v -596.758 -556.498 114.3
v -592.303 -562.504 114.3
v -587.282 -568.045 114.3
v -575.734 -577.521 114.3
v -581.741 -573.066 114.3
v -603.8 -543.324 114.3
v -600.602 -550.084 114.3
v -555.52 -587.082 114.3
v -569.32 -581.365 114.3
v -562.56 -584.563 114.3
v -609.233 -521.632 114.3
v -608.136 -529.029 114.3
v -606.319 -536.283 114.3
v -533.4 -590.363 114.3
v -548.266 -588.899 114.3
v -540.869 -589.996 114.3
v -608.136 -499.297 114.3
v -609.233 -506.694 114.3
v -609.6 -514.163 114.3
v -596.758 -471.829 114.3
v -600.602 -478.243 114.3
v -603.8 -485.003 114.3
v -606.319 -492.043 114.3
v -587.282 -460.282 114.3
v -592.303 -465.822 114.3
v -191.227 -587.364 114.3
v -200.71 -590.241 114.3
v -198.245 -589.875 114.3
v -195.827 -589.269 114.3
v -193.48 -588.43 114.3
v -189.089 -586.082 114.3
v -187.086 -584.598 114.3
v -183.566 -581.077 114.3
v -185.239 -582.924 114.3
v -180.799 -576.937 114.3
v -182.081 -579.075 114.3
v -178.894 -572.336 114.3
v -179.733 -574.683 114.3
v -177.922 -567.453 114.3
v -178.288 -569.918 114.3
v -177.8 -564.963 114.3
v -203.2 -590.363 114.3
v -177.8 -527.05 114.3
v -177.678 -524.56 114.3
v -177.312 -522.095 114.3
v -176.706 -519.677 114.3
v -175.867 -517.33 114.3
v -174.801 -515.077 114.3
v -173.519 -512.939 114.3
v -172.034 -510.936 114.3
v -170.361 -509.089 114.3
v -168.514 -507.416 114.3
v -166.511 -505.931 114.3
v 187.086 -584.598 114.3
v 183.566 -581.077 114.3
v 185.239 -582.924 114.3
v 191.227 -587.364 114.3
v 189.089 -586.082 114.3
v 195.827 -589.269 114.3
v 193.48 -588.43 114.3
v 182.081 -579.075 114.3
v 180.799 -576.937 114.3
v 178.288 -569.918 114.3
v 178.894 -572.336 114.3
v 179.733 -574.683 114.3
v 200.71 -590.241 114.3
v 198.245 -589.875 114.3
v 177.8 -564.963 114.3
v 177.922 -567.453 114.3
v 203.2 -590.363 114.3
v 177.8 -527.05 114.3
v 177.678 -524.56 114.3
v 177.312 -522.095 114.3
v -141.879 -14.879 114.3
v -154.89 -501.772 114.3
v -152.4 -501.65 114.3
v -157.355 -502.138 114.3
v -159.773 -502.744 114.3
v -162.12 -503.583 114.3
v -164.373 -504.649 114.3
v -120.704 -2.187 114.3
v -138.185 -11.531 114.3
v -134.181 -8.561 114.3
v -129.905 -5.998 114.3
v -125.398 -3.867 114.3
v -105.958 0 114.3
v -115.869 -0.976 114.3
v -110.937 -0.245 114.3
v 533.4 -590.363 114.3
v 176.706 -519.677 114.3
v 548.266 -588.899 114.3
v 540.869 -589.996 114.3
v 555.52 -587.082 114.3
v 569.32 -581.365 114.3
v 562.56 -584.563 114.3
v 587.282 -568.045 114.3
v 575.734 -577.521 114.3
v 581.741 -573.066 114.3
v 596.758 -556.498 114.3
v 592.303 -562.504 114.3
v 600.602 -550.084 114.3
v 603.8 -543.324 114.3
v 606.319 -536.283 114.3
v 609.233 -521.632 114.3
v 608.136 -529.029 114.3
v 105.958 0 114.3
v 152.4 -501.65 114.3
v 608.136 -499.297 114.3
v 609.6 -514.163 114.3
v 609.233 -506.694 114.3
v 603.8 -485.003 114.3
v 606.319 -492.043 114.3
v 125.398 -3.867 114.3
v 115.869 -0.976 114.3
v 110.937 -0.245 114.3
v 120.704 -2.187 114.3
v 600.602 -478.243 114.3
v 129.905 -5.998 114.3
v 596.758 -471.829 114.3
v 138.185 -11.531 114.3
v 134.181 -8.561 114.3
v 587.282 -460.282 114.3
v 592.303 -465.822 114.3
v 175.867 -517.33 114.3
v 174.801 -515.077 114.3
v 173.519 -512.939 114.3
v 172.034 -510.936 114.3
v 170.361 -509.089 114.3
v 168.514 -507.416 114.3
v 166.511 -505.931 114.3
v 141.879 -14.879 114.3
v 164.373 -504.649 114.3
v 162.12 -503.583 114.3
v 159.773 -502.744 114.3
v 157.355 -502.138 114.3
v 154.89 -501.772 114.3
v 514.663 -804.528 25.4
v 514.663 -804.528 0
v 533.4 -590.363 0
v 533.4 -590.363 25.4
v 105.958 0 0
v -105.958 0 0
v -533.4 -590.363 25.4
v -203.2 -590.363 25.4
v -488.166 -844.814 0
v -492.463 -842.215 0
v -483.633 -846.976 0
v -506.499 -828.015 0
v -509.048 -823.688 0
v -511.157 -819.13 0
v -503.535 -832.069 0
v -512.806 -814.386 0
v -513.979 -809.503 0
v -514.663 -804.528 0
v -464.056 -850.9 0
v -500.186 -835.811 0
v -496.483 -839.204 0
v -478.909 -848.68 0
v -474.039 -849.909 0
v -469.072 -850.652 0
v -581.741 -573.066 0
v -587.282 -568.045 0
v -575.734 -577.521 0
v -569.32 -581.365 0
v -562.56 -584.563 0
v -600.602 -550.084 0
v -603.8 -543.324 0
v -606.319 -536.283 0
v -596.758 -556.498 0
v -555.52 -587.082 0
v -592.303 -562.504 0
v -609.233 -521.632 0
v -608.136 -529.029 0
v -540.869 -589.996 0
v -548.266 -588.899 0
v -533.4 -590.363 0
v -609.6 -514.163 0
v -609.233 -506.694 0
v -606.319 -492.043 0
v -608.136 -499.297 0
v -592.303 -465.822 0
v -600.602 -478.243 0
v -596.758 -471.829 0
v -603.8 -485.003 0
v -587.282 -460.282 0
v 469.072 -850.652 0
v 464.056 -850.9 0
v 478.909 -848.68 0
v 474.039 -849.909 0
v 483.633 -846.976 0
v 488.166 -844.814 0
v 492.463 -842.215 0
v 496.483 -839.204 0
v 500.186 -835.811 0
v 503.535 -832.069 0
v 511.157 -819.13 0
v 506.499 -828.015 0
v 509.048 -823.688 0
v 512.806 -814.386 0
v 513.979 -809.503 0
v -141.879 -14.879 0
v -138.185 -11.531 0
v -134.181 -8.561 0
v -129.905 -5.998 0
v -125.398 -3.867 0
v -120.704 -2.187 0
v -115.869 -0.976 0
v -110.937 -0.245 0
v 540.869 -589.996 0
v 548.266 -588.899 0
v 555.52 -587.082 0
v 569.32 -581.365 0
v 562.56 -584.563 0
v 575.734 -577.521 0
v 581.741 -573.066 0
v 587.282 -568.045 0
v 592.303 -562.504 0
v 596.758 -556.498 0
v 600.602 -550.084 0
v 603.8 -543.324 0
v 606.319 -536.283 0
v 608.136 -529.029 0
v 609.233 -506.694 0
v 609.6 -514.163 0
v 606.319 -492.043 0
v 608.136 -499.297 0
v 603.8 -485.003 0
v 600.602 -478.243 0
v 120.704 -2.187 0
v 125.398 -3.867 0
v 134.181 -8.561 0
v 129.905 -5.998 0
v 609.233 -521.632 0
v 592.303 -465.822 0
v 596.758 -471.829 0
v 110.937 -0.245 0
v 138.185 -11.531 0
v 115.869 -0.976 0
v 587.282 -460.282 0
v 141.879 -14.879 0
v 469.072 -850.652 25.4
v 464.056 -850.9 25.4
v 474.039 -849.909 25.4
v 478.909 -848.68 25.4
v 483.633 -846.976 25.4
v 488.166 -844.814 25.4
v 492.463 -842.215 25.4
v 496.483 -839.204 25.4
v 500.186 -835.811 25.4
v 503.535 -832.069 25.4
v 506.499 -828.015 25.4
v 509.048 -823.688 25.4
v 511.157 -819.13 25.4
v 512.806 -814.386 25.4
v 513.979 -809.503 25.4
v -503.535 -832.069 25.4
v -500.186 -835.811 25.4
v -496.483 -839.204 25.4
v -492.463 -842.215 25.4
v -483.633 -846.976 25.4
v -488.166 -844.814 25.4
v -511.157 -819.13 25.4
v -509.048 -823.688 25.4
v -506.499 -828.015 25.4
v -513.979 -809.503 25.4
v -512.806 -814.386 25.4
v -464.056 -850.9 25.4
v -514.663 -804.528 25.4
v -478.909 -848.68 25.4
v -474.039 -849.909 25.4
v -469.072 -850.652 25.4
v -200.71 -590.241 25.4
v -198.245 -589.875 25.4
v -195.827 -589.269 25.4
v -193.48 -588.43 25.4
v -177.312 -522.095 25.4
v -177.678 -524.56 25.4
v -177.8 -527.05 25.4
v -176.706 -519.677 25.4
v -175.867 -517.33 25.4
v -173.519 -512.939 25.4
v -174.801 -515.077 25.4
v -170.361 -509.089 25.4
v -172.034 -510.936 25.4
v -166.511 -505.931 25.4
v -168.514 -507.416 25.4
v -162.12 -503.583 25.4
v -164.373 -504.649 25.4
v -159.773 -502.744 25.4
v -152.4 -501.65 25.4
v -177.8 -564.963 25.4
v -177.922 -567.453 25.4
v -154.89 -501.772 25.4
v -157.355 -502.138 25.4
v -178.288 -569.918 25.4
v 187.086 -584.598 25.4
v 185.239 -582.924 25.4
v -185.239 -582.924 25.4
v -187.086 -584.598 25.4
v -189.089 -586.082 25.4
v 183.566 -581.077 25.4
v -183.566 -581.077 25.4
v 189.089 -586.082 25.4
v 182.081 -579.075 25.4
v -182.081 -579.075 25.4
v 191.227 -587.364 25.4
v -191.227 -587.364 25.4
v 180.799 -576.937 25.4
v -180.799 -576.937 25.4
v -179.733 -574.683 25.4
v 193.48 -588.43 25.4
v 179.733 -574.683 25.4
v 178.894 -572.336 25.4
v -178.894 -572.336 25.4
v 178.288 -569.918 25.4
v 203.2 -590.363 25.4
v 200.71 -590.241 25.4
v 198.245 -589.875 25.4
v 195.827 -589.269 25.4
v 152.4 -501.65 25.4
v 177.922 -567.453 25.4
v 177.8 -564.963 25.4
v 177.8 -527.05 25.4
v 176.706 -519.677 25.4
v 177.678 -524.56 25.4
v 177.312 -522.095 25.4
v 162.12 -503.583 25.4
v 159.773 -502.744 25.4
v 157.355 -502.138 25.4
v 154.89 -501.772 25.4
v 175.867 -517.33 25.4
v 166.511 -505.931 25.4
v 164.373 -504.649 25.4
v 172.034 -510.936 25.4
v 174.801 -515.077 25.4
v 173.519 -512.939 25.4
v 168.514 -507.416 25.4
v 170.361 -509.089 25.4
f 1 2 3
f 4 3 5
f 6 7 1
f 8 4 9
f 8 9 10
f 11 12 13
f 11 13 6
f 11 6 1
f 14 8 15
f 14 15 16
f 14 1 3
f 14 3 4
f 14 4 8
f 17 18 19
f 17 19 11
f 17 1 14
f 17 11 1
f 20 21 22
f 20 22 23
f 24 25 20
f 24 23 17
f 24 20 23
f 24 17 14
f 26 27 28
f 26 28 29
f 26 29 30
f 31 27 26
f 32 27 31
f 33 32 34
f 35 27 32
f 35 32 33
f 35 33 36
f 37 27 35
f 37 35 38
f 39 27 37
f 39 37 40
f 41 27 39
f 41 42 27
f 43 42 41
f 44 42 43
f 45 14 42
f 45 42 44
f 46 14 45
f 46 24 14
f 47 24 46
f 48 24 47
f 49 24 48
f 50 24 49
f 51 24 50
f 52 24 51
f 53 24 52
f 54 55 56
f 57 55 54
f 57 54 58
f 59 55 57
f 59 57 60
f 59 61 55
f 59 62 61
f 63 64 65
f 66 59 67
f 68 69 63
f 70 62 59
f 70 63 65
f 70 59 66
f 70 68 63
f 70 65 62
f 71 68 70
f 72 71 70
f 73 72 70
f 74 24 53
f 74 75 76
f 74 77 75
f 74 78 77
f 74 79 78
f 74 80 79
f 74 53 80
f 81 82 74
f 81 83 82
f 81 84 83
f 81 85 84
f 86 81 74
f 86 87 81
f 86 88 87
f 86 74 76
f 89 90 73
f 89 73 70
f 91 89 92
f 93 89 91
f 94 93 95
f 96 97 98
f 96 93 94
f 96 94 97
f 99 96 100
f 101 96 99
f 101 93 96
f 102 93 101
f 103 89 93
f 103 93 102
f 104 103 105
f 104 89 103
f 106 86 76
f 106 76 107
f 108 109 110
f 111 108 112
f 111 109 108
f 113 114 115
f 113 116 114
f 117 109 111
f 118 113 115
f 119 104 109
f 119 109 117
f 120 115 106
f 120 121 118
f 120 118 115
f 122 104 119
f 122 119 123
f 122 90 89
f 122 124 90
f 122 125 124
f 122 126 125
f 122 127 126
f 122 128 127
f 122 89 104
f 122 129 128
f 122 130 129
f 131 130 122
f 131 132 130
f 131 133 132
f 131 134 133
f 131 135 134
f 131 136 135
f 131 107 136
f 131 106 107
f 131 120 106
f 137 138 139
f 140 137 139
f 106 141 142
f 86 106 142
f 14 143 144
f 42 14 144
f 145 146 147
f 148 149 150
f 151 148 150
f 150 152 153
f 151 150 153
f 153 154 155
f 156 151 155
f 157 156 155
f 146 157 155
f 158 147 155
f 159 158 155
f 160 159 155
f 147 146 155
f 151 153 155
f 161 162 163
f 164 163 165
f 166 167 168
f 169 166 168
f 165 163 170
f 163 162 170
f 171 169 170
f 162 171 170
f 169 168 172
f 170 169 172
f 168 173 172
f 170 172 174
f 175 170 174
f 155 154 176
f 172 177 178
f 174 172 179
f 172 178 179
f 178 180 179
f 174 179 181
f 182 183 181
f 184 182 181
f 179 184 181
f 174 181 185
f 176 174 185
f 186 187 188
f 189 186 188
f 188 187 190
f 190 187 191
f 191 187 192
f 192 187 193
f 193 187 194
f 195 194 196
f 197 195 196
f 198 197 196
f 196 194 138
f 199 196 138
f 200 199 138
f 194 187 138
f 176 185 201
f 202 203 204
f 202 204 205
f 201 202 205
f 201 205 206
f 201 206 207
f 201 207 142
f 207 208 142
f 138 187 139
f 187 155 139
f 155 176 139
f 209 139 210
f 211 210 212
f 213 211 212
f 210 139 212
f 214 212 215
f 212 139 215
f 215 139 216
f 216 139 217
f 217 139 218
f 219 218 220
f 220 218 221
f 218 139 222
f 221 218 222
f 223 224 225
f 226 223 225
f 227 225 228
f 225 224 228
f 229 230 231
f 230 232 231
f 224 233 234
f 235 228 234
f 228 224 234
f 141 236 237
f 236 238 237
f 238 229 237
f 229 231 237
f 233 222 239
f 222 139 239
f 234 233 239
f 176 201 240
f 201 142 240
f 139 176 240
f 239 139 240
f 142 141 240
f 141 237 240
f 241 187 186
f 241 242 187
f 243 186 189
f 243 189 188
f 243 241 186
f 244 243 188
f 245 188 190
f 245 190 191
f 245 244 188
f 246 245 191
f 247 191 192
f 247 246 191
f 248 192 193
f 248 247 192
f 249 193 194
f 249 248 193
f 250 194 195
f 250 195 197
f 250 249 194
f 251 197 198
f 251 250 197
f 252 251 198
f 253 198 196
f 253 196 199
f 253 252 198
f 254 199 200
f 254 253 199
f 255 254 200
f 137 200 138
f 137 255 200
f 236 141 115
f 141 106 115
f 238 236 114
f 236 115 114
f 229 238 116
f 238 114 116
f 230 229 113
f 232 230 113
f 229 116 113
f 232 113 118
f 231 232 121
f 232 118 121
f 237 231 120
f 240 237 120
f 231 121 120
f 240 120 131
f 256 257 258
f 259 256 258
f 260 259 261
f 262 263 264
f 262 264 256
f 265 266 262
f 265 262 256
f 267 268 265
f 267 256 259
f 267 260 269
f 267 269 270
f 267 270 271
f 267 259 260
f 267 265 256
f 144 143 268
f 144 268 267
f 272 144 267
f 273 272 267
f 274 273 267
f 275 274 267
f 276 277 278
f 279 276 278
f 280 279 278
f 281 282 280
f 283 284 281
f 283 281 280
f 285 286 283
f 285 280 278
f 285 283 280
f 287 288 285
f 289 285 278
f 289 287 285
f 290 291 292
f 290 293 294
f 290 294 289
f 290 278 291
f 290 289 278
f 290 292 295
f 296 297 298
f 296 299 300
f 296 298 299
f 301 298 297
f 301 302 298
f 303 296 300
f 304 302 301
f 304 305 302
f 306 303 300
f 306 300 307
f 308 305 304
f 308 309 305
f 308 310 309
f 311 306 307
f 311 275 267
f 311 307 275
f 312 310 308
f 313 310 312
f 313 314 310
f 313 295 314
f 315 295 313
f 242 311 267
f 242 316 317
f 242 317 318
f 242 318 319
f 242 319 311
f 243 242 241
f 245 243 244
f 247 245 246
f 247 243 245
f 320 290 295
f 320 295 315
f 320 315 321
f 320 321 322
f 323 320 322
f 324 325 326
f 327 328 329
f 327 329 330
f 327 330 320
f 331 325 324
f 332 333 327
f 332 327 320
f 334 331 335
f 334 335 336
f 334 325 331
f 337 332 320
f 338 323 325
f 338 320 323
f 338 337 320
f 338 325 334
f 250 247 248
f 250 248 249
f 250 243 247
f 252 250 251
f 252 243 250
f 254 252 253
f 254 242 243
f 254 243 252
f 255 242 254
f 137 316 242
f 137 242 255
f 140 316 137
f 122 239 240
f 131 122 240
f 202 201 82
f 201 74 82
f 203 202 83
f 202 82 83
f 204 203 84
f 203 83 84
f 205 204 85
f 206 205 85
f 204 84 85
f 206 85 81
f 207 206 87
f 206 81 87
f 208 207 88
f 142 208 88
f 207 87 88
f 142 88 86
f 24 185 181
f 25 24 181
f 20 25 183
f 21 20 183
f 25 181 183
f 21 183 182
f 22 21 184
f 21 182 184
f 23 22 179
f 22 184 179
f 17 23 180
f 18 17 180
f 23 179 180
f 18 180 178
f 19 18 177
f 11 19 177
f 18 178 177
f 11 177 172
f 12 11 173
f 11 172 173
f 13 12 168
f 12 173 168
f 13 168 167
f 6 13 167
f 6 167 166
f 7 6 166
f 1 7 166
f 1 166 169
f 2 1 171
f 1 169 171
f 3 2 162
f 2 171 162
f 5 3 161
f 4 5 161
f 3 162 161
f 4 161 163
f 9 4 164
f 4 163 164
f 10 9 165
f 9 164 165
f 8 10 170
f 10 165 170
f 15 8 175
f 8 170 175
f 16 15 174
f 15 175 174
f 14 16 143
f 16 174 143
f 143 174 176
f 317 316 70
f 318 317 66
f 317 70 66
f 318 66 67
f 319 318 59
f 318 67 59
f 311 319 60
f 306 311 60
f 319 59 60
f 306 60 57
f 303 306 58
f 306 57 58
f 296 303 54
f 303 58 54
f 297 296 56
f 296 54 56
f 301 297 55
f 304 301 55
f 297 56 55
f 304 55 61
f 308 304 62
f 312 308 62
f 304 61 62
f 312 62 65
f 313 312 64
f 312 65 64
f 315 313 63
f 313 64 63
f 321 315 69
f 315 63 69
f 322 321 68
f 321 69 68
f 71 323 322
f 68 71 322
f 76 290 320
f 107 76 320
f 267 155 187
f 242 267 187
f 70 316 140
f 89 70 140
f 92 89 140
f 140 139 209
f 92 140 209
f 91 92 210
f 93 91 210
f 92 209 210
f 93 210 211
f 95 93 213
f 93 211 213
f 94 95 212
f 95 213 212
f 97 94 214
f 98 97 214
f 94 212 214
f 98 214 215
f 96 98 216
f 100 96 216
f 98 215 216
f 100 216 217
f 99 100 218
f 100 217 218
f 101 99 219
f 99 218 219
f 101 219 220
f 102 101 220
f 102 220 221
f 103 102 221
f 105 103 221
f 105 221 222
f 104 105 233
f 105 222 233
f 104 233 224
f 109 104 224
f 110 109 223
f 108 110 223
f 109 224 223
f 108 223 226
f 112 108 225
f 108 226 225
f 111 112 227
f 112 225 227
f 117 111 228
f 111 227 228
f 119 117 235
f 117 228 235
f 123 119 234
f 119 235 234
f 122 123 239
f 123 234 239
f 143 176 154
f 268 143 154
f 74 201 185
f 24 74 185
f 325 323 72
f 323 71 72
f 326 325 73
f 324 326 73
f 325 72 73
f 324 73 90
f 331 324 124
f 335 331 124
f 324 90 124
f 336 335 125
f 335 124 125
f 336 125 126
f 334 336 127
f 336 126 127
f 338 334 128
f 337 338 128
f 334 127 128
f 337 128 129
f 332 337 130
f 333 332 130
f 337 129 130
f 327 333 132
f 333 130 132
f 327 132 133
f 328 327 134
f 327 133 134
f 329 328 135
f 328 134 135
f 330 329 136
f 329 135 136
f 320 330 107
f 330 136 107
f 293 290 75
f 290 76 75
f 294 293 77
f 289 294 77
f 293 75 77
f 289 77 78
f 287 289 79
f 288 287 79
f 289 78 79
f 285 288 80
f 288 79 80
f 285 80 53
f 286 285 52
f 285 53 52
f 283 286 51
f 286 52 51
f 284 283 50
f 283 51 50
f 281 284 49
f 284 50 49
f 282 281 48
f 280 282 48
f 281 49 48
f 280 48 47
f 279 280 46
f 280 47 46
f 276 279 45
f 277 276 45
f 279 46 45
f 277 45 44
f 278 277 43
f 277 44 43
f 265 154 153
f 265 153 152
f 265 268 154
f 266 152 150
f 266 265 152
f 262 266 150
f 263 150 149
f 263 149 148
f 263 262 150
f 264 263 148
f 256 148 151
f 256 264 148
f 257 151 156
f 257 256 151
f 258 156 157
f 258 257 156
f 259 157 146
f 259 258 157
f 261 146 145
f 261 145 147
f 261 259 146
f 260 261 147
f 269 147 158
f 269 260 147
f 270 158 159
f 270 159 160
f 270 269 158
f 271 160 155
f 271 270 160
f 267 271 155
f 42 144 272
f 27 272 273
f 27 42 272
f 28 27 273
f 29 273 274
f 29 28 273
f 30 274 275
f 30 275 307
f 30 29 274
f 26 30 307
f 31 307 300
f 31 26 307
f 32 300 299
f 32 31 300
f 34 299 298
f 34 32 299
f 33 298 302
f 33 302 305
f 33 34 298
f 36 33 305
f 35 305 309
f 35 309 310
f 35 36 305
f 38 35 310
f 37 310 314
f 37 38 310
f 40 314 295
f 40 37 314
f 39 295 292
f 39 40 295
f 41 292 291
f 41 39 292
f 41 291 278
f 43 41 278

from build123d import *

# Parameters (mm, degrees)
F1_DEPTH = 114.3
F2_DEPTH = 25.4
F3_R     = 25.4
F4_R     = 50.8


with BuildPart() as f1:
    # F0 (on Top) → F1 (new body)
    with BuildSketch(Plane.XY):
        with BuildLine():
            Line((127, 0), (-127, 0))
            Line((-127, 0), (-587.281537, -460.281537))
            ThreePointArc((-587.281537, -460.281537), (-603.79962, -543.323551), (-533.4, -590.363073))
            Line((-533.4, -590.363073), (-177.8, -590.363073))
            Line((-177.8, -590.363073), (-177.8, -501.65))
            Line((-177.8, -501.65), (177.8, -501.65))
            Line((177.8, -501.65), (177.8, -590.363073))
            Line((177.8, -590.363073), (533.4, -590.363073))
            ThreePointArc((533.4, -590.363073), (603.79962, -543.323551), (587.281537, -460.281537))
            Line((587.281537, -460.281537), (127, 0))
        make_face()
    extrude(amount=F1_DEPTH)

    # F0 (on Top) → F2 (join)
    with BuildSketch(Plane.XY):
        Polygon((-177.8, -590.363073), (-533.4, -590.363073), (-510.605972, -850.9), (510.605972, -850.9), (533.4, -590.363073), (177.8, -590.363073), (177.8, -501.65), (-177.8, -501.65), align=None)
    extrude(amount=F2_DEPTH)

    # F3
    f3_edges = [f1.edges().sort_by_distance(p)[0] for p in [
        (-177.8, -590.363073, 69.85),
        (177.8, -590.363073, 69.85),
        (177.8, -501.65, 69.85),
        (-177.8, -501.65, 69.85),
    ]]
    fillet(f3_edges, radius=F3_R)

    # F4
    f4_edges = [f1.edges().sort_by_distance(p)[0] for p in [
        (-127, 0, 57.15),
        (127, 0, 57.15),
        (-510.605972, -850.9, 12.7),
        (510.605972, -850.9, 12.7),
    ]]
    fillet(f4_edges, radius=F4_R)


solid = f1.part
